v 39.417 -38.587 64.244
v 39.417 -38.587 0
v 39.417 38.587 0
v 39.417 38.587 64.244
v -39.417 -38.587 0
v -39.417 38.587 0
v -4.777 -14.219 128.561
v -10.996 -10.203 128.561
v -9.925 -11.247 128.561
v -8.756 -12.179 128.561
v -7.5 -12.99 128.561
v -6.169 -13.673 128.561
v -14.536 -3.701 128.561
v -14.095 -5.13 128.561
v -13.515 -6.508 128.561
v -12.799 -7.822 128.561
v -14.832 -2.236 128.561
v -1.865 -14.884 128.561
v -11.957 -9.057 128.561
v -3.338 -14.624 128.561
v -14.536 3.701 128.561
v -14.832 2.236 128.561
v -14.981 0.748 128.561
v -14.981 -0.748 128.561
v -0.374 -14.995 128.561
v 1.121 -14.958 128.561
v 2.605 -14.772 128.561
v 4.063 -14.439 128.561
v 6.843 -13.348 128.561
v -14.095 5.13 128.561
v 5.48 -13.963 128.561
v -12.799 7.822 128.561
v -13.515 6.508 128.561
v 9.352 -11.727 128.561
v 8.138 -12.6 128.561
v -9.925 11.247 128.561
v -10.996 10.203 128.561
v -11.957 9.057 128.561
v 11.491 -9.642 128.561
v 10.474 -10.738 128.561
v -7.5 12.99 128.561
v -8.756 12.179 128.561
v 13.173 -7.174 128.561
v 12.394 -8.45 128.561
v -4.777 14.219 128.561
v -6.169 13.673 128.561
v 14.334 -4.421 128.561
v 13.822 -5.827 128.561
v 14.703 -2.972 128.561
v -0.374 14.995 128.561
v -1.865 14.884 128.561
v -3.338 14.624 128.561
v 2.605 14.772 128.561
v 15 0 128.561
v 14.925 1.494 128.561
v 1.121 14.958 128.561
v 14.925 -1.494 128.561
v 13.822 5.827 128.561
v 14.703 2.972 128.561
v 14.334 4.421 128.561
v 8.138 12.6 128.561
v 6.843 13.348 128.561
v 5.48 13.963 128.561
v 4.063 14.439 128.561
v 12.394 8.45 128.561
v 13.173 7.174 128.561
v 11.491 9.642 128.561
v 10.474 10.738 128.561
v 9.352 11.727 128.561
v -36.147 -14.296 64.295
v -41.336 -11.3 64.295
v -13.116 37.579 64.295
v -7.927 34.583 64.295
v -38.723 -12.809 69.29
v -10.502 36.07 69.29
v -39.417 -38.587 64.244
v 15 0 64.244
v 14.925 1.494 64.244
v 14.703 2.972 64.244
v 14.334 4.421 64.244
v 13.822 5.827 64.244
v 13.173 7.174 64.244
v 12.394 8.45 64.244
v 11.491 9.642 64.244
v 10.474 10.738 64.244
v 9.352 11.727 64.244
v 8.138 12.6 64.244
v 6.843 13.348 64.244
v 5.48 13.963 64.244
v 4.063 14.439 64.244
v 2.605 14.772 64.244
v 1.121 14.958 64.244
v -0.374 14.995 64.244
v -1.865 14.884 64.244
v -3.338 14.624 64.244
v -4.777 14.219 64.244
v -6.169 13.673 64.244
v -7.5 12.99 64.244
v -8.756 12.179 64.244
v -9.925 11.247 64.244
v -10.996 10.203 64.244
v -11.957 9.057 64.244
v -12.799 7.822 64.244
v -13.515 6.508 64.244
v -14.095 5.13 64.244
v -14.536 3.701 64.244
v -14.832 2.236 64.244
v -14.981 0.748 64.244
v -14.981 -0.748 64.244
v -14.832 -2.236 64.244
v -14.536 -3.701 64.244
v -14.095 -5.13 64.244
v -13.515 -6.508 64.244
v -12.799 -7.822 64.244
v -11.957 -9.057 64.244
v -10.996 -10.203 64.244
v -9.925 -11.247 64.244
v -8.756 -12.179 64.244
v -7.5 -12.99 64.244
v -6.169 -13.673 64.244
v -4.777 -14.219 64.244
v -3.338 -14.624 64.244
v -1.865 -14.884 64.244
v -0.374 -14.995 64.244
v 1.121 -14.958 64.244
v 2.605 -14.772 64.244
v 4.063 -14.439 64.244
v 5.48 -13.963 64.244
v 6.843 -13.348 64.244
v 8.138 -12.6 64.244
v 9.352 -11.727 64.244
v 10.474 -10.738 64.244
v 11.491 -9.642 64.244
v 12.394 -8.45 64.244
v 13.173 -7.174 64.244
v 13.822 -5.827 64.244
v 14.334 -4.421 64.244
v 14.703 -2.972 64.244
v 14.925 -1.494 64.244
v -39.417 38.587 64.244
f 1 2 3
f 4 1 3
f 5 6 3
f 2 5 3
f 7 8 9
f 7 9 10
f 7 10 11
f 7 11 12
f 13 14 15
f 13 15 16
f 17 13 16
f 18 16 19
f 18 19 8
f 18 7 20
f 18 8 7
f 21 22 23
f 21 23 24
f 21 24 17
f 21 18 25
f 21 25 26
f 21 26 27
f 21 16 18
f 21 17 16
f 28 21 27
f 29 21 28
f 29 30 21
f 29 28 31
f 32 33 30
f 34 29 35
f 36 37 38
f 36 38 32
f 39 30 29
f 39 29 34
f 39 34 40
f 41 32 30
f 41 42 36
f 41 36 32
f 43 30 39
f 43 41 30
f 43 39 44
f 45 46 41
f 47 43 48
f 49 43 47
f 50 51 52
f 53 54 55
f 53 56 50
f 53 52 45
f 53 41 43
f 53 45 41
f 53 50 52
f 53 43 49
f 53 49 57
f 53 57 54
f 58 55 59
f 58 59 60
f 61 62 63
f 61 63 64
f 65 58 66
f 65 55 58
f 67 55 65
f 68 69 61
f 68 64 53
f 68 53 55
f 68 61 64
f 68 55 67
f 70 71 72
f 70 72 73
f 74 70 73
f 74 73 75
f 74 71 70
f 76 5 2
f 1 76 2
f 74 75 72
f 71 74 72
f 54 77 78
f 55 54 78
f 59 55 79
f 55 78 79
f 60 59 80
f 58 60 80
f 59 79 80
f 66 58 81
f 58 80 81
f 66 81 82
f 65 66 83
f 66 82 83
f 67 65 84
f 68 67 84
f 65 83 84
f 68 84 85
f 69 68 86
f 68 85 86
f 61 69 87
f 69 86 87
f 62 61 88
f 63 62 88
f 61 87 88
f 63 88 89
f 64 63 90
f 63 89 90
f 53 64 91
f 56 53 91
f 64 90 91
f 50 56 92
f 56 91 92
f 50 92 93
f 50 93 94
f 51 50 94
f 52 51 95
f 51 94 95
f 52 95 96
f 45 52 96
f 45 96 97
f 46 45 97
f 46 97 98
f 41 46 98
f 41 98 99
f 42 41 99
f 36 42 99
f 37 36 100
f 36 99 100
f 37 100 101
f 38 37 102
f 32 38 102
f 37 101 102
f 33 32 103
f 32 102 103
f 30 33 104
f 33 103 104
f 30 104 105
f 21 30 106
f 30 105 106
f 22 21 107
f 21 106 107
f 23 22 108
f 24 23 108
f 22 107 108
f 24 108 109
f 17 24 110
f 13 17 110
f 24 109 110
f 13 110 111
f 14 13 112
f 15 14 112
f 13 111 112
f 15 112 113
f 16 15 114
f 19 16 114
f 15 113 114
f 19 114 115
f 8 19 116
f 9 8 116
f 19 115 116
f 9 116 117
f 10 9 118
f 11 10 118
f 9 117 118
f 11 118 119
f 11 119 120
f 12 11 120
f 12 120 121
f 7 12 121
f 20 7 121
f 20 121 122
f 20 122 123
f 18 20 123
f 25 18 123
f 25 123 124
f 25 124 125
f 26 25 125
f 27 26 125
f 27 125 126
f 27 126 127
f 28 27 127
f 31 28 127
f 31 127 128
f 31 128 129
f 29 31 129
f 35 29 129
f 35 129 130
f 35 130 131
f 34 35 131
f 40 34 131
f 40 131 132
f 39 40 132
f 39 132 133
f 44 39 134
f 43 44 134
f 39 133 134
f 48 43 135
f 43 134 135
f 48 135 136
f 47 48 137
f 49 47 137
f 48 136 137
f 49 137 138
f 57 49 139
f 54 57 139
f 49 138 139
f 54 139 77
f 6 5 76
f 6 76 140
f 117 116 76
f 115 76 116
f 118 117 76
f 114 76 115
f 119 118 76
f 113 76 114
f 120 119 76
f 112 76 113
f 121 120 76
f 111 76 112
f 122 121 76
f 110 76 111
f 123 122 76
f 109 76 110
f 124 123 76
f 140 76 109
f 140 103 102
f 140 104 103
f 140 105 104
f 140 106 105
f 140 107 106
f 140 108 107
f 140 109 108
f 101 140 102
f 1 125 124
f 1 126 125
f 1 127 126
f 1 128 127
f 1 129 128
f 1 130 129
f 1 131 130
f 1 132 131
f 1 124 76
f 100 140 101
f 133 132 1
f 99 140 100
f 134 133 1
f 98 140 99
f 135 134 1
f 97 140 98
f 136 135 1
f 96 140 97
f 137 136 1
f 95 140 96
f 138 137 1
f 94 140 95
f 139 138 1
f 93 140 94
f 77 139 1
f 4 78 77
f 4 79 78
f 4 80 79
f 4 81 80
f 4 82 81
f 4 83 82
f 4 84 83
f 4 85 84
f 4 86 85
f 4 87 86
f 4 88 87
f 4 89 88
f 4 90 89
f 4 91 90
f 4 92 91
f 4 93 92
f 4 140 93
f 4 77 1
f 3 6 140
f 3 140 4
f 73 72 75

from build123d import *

# Parameters (mm, degrees)
F0_W     = 78.83364
F0_H     = 77.174082
F1_DEPTH = 64.244159
F2_R     = 15
F3_DEPTH = 64.316727
F6_DEPTH = 56.440815


with BuildPart() as f1:
    # F0 (on Top) → F1 (new body)
    with BuildSketch(Plane.XY):
        Rectangle(F0_W, F0_H)
    extrude(amount=F1_DEPTH)

    # F2 (on face) → F3 (join)
    with BuildSketch(Plane.XY.offset(64.244159)):
        Circle(F2_R)
    extrude(amount=F3_DEPTH)


with BuildPart() as f6:
    # F5 (on face) → F6 (new body)
    with BuildSketch(Plane(origin=(-15.227205, -26.374293, 0), x_dir=(0.866025, -0.5, 0), z_dir=(-0.5, -0.866025, 0))):
        Polygon((-27.13016, 69.290325), (-30.148327, 64.295124), (-24.156339, 64.295124), align=None)
    extrude(amount=-F6_DEPTH)


solid = Compound([f1.part, f6.part])
